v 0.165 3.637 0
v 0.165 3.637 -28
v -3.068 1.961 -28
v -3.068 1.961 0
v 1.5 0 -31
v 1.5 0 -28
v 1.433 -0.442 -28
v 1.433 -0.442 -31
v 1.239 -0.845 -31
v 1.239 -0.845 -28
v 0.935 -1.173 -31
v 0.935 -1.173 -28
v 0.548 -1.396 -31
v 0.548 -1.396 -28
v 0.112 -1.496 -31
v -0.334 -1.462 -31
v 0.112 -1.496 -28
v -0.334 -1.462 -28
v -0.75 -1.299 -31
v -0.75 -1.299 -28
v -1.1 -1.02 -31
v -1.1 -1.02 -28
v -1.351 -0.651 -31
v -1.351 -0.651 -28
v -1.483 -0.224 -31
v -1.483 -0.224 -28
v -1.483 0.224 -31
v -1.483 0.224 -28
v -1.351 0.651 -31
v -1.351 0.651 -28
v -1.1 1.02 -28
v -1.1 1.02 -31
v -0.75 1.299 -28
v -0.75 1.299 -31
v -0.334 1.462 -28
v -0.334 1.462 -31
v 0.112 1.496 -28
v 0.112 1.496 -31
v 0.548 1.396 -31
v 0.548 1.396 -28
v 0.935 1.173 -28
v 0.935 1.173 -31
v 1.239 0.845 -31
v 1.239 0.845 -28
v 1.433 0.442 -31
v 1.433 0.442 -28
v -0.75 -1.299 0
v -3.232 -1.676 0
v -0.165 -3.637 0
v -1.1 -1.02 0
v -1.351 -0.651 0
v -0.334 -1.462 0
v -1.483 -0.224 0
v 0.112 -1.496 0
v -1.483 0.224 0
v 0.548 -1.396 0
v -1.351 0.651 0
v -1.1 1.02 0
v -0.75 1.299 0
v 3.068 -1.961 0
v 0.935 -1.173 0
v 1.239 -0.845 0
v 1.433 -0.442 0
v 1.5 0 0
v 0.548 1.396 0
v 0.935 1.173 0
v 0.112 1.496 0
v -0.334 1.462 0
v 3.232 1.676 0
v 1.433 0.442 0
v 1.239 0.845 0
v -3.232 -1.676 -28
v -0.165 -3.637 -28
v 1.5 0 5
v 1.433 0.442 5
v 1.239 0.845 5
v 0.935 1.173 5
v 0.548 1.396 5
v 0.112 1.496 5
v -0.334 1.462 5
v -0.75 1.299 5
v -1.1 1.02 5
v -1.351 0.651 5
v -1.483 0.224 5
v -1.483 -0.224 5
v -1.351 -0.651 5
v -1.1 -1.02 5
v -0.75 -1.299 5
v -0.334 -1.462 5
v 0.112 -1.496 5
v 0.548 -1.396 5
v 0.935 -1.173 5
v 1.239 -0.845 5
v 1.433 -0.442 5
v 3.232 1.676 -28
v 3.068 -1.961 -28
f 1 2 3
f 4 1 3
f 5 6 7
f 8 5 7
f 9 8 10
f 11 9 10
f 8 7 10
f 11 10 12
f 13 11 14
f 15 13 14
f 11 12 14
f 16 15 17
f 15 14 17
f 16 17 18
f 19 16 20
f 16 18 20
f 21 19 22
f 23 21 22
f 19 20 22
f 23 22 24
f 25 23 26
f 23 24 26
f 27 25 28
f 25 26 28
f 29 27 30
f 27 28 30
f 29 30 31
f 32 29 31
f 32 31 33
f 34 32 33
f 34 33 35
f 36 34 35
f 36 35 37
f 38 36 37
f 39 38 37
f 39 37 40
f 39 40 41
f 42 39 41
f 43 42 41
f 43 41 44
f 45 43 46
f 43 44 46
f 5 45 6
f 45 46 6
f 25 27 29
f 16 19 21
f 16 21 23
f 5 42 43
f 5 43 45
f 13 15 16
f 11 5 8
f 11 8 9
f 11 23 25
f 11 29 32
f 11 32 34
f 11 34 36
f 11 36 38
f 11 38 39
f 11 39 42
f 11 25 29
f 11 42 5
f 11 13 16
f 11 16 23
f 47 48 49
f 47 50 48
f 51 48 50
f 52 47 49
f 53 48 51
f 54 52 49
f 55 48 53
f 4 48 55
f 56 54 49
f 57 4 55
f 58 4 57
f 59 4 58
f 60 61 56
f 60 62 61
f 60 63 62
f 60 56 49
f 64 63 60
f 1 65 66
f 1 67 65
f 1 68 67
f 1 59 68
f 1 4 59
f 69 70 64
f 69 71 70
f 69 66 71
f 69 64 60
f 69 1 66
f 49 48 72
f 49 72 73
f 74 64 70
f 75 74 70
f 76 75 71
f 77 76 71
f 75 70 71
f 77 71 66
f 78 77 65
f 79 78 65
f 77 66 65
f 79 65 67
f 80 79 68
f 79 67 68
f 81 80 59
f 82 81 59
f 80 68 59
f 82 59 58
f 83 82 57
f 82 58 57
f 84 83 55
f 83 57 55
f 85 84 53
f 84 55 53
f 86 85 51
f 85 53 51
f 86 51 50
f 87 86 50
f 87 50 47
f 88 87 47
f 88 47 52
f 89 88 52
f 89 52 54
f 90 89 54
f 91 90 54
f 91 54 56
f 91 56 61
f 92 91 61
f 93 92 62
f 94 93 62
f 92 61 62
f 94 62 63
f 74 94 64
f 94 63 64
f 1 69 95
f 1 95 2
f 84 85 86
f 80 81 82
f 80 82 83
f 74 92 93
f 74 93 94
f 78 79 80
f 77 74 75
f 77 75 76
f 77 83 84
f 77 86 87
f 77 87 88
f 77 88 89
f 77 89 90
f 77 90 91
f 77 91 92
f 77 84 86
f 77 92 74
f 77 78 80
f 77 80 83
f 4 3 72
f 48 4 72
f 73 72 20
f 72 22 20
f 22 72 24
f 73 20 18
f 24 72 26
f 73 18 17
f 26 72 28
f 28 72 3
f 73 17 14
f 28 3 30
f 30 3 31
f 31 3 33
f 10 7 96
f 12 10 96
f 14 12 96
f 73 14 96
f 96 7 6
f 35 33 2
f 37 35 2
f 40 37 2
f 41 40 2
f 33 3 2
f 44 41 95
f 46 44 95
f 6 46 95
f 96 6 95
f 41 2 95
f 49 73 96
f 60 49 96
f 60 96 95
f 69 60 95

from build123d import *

# Parameters (mm, degrees)
F0_R     = 1.5
F1_DEPTH = 28
F2_DEPTH = 5
F3_R     = 1.5
F4_DEPTH = 3


with BuildPart() as f1:
    # F0 (on Top) → F1 (new body)
    with BuildSketch(Plane.XY):
        Polygon((-3.232447, -1.675851), (-0.164893, -3.637307), (3.067553, -1.961455), (3.232447, 1.675851), (0.164893, 3.637307), (-3.067553, 1.961455), align=None)
        Circle(F0_R, mode=Mode.SUBTRACT)
        Circle(F0_R)
    extrude(amount=-F1_DEPTH)

    # F0 (on Top) → F2 (join)
    with BuildSketch(Plane.XY):
        Circle(F0_R)
    extrude(amount=F2_DEPTH)

    # F3 (on face) → F4 (join)
    with BuildSketch(Plane(origin=(0, 0, -28), x_dir=(1, 0, 0), z_dir=(0, 0, -1))):
        Circle(F3_R)
    extrude(amount=F4_DEPTH)


solid = f1.part
